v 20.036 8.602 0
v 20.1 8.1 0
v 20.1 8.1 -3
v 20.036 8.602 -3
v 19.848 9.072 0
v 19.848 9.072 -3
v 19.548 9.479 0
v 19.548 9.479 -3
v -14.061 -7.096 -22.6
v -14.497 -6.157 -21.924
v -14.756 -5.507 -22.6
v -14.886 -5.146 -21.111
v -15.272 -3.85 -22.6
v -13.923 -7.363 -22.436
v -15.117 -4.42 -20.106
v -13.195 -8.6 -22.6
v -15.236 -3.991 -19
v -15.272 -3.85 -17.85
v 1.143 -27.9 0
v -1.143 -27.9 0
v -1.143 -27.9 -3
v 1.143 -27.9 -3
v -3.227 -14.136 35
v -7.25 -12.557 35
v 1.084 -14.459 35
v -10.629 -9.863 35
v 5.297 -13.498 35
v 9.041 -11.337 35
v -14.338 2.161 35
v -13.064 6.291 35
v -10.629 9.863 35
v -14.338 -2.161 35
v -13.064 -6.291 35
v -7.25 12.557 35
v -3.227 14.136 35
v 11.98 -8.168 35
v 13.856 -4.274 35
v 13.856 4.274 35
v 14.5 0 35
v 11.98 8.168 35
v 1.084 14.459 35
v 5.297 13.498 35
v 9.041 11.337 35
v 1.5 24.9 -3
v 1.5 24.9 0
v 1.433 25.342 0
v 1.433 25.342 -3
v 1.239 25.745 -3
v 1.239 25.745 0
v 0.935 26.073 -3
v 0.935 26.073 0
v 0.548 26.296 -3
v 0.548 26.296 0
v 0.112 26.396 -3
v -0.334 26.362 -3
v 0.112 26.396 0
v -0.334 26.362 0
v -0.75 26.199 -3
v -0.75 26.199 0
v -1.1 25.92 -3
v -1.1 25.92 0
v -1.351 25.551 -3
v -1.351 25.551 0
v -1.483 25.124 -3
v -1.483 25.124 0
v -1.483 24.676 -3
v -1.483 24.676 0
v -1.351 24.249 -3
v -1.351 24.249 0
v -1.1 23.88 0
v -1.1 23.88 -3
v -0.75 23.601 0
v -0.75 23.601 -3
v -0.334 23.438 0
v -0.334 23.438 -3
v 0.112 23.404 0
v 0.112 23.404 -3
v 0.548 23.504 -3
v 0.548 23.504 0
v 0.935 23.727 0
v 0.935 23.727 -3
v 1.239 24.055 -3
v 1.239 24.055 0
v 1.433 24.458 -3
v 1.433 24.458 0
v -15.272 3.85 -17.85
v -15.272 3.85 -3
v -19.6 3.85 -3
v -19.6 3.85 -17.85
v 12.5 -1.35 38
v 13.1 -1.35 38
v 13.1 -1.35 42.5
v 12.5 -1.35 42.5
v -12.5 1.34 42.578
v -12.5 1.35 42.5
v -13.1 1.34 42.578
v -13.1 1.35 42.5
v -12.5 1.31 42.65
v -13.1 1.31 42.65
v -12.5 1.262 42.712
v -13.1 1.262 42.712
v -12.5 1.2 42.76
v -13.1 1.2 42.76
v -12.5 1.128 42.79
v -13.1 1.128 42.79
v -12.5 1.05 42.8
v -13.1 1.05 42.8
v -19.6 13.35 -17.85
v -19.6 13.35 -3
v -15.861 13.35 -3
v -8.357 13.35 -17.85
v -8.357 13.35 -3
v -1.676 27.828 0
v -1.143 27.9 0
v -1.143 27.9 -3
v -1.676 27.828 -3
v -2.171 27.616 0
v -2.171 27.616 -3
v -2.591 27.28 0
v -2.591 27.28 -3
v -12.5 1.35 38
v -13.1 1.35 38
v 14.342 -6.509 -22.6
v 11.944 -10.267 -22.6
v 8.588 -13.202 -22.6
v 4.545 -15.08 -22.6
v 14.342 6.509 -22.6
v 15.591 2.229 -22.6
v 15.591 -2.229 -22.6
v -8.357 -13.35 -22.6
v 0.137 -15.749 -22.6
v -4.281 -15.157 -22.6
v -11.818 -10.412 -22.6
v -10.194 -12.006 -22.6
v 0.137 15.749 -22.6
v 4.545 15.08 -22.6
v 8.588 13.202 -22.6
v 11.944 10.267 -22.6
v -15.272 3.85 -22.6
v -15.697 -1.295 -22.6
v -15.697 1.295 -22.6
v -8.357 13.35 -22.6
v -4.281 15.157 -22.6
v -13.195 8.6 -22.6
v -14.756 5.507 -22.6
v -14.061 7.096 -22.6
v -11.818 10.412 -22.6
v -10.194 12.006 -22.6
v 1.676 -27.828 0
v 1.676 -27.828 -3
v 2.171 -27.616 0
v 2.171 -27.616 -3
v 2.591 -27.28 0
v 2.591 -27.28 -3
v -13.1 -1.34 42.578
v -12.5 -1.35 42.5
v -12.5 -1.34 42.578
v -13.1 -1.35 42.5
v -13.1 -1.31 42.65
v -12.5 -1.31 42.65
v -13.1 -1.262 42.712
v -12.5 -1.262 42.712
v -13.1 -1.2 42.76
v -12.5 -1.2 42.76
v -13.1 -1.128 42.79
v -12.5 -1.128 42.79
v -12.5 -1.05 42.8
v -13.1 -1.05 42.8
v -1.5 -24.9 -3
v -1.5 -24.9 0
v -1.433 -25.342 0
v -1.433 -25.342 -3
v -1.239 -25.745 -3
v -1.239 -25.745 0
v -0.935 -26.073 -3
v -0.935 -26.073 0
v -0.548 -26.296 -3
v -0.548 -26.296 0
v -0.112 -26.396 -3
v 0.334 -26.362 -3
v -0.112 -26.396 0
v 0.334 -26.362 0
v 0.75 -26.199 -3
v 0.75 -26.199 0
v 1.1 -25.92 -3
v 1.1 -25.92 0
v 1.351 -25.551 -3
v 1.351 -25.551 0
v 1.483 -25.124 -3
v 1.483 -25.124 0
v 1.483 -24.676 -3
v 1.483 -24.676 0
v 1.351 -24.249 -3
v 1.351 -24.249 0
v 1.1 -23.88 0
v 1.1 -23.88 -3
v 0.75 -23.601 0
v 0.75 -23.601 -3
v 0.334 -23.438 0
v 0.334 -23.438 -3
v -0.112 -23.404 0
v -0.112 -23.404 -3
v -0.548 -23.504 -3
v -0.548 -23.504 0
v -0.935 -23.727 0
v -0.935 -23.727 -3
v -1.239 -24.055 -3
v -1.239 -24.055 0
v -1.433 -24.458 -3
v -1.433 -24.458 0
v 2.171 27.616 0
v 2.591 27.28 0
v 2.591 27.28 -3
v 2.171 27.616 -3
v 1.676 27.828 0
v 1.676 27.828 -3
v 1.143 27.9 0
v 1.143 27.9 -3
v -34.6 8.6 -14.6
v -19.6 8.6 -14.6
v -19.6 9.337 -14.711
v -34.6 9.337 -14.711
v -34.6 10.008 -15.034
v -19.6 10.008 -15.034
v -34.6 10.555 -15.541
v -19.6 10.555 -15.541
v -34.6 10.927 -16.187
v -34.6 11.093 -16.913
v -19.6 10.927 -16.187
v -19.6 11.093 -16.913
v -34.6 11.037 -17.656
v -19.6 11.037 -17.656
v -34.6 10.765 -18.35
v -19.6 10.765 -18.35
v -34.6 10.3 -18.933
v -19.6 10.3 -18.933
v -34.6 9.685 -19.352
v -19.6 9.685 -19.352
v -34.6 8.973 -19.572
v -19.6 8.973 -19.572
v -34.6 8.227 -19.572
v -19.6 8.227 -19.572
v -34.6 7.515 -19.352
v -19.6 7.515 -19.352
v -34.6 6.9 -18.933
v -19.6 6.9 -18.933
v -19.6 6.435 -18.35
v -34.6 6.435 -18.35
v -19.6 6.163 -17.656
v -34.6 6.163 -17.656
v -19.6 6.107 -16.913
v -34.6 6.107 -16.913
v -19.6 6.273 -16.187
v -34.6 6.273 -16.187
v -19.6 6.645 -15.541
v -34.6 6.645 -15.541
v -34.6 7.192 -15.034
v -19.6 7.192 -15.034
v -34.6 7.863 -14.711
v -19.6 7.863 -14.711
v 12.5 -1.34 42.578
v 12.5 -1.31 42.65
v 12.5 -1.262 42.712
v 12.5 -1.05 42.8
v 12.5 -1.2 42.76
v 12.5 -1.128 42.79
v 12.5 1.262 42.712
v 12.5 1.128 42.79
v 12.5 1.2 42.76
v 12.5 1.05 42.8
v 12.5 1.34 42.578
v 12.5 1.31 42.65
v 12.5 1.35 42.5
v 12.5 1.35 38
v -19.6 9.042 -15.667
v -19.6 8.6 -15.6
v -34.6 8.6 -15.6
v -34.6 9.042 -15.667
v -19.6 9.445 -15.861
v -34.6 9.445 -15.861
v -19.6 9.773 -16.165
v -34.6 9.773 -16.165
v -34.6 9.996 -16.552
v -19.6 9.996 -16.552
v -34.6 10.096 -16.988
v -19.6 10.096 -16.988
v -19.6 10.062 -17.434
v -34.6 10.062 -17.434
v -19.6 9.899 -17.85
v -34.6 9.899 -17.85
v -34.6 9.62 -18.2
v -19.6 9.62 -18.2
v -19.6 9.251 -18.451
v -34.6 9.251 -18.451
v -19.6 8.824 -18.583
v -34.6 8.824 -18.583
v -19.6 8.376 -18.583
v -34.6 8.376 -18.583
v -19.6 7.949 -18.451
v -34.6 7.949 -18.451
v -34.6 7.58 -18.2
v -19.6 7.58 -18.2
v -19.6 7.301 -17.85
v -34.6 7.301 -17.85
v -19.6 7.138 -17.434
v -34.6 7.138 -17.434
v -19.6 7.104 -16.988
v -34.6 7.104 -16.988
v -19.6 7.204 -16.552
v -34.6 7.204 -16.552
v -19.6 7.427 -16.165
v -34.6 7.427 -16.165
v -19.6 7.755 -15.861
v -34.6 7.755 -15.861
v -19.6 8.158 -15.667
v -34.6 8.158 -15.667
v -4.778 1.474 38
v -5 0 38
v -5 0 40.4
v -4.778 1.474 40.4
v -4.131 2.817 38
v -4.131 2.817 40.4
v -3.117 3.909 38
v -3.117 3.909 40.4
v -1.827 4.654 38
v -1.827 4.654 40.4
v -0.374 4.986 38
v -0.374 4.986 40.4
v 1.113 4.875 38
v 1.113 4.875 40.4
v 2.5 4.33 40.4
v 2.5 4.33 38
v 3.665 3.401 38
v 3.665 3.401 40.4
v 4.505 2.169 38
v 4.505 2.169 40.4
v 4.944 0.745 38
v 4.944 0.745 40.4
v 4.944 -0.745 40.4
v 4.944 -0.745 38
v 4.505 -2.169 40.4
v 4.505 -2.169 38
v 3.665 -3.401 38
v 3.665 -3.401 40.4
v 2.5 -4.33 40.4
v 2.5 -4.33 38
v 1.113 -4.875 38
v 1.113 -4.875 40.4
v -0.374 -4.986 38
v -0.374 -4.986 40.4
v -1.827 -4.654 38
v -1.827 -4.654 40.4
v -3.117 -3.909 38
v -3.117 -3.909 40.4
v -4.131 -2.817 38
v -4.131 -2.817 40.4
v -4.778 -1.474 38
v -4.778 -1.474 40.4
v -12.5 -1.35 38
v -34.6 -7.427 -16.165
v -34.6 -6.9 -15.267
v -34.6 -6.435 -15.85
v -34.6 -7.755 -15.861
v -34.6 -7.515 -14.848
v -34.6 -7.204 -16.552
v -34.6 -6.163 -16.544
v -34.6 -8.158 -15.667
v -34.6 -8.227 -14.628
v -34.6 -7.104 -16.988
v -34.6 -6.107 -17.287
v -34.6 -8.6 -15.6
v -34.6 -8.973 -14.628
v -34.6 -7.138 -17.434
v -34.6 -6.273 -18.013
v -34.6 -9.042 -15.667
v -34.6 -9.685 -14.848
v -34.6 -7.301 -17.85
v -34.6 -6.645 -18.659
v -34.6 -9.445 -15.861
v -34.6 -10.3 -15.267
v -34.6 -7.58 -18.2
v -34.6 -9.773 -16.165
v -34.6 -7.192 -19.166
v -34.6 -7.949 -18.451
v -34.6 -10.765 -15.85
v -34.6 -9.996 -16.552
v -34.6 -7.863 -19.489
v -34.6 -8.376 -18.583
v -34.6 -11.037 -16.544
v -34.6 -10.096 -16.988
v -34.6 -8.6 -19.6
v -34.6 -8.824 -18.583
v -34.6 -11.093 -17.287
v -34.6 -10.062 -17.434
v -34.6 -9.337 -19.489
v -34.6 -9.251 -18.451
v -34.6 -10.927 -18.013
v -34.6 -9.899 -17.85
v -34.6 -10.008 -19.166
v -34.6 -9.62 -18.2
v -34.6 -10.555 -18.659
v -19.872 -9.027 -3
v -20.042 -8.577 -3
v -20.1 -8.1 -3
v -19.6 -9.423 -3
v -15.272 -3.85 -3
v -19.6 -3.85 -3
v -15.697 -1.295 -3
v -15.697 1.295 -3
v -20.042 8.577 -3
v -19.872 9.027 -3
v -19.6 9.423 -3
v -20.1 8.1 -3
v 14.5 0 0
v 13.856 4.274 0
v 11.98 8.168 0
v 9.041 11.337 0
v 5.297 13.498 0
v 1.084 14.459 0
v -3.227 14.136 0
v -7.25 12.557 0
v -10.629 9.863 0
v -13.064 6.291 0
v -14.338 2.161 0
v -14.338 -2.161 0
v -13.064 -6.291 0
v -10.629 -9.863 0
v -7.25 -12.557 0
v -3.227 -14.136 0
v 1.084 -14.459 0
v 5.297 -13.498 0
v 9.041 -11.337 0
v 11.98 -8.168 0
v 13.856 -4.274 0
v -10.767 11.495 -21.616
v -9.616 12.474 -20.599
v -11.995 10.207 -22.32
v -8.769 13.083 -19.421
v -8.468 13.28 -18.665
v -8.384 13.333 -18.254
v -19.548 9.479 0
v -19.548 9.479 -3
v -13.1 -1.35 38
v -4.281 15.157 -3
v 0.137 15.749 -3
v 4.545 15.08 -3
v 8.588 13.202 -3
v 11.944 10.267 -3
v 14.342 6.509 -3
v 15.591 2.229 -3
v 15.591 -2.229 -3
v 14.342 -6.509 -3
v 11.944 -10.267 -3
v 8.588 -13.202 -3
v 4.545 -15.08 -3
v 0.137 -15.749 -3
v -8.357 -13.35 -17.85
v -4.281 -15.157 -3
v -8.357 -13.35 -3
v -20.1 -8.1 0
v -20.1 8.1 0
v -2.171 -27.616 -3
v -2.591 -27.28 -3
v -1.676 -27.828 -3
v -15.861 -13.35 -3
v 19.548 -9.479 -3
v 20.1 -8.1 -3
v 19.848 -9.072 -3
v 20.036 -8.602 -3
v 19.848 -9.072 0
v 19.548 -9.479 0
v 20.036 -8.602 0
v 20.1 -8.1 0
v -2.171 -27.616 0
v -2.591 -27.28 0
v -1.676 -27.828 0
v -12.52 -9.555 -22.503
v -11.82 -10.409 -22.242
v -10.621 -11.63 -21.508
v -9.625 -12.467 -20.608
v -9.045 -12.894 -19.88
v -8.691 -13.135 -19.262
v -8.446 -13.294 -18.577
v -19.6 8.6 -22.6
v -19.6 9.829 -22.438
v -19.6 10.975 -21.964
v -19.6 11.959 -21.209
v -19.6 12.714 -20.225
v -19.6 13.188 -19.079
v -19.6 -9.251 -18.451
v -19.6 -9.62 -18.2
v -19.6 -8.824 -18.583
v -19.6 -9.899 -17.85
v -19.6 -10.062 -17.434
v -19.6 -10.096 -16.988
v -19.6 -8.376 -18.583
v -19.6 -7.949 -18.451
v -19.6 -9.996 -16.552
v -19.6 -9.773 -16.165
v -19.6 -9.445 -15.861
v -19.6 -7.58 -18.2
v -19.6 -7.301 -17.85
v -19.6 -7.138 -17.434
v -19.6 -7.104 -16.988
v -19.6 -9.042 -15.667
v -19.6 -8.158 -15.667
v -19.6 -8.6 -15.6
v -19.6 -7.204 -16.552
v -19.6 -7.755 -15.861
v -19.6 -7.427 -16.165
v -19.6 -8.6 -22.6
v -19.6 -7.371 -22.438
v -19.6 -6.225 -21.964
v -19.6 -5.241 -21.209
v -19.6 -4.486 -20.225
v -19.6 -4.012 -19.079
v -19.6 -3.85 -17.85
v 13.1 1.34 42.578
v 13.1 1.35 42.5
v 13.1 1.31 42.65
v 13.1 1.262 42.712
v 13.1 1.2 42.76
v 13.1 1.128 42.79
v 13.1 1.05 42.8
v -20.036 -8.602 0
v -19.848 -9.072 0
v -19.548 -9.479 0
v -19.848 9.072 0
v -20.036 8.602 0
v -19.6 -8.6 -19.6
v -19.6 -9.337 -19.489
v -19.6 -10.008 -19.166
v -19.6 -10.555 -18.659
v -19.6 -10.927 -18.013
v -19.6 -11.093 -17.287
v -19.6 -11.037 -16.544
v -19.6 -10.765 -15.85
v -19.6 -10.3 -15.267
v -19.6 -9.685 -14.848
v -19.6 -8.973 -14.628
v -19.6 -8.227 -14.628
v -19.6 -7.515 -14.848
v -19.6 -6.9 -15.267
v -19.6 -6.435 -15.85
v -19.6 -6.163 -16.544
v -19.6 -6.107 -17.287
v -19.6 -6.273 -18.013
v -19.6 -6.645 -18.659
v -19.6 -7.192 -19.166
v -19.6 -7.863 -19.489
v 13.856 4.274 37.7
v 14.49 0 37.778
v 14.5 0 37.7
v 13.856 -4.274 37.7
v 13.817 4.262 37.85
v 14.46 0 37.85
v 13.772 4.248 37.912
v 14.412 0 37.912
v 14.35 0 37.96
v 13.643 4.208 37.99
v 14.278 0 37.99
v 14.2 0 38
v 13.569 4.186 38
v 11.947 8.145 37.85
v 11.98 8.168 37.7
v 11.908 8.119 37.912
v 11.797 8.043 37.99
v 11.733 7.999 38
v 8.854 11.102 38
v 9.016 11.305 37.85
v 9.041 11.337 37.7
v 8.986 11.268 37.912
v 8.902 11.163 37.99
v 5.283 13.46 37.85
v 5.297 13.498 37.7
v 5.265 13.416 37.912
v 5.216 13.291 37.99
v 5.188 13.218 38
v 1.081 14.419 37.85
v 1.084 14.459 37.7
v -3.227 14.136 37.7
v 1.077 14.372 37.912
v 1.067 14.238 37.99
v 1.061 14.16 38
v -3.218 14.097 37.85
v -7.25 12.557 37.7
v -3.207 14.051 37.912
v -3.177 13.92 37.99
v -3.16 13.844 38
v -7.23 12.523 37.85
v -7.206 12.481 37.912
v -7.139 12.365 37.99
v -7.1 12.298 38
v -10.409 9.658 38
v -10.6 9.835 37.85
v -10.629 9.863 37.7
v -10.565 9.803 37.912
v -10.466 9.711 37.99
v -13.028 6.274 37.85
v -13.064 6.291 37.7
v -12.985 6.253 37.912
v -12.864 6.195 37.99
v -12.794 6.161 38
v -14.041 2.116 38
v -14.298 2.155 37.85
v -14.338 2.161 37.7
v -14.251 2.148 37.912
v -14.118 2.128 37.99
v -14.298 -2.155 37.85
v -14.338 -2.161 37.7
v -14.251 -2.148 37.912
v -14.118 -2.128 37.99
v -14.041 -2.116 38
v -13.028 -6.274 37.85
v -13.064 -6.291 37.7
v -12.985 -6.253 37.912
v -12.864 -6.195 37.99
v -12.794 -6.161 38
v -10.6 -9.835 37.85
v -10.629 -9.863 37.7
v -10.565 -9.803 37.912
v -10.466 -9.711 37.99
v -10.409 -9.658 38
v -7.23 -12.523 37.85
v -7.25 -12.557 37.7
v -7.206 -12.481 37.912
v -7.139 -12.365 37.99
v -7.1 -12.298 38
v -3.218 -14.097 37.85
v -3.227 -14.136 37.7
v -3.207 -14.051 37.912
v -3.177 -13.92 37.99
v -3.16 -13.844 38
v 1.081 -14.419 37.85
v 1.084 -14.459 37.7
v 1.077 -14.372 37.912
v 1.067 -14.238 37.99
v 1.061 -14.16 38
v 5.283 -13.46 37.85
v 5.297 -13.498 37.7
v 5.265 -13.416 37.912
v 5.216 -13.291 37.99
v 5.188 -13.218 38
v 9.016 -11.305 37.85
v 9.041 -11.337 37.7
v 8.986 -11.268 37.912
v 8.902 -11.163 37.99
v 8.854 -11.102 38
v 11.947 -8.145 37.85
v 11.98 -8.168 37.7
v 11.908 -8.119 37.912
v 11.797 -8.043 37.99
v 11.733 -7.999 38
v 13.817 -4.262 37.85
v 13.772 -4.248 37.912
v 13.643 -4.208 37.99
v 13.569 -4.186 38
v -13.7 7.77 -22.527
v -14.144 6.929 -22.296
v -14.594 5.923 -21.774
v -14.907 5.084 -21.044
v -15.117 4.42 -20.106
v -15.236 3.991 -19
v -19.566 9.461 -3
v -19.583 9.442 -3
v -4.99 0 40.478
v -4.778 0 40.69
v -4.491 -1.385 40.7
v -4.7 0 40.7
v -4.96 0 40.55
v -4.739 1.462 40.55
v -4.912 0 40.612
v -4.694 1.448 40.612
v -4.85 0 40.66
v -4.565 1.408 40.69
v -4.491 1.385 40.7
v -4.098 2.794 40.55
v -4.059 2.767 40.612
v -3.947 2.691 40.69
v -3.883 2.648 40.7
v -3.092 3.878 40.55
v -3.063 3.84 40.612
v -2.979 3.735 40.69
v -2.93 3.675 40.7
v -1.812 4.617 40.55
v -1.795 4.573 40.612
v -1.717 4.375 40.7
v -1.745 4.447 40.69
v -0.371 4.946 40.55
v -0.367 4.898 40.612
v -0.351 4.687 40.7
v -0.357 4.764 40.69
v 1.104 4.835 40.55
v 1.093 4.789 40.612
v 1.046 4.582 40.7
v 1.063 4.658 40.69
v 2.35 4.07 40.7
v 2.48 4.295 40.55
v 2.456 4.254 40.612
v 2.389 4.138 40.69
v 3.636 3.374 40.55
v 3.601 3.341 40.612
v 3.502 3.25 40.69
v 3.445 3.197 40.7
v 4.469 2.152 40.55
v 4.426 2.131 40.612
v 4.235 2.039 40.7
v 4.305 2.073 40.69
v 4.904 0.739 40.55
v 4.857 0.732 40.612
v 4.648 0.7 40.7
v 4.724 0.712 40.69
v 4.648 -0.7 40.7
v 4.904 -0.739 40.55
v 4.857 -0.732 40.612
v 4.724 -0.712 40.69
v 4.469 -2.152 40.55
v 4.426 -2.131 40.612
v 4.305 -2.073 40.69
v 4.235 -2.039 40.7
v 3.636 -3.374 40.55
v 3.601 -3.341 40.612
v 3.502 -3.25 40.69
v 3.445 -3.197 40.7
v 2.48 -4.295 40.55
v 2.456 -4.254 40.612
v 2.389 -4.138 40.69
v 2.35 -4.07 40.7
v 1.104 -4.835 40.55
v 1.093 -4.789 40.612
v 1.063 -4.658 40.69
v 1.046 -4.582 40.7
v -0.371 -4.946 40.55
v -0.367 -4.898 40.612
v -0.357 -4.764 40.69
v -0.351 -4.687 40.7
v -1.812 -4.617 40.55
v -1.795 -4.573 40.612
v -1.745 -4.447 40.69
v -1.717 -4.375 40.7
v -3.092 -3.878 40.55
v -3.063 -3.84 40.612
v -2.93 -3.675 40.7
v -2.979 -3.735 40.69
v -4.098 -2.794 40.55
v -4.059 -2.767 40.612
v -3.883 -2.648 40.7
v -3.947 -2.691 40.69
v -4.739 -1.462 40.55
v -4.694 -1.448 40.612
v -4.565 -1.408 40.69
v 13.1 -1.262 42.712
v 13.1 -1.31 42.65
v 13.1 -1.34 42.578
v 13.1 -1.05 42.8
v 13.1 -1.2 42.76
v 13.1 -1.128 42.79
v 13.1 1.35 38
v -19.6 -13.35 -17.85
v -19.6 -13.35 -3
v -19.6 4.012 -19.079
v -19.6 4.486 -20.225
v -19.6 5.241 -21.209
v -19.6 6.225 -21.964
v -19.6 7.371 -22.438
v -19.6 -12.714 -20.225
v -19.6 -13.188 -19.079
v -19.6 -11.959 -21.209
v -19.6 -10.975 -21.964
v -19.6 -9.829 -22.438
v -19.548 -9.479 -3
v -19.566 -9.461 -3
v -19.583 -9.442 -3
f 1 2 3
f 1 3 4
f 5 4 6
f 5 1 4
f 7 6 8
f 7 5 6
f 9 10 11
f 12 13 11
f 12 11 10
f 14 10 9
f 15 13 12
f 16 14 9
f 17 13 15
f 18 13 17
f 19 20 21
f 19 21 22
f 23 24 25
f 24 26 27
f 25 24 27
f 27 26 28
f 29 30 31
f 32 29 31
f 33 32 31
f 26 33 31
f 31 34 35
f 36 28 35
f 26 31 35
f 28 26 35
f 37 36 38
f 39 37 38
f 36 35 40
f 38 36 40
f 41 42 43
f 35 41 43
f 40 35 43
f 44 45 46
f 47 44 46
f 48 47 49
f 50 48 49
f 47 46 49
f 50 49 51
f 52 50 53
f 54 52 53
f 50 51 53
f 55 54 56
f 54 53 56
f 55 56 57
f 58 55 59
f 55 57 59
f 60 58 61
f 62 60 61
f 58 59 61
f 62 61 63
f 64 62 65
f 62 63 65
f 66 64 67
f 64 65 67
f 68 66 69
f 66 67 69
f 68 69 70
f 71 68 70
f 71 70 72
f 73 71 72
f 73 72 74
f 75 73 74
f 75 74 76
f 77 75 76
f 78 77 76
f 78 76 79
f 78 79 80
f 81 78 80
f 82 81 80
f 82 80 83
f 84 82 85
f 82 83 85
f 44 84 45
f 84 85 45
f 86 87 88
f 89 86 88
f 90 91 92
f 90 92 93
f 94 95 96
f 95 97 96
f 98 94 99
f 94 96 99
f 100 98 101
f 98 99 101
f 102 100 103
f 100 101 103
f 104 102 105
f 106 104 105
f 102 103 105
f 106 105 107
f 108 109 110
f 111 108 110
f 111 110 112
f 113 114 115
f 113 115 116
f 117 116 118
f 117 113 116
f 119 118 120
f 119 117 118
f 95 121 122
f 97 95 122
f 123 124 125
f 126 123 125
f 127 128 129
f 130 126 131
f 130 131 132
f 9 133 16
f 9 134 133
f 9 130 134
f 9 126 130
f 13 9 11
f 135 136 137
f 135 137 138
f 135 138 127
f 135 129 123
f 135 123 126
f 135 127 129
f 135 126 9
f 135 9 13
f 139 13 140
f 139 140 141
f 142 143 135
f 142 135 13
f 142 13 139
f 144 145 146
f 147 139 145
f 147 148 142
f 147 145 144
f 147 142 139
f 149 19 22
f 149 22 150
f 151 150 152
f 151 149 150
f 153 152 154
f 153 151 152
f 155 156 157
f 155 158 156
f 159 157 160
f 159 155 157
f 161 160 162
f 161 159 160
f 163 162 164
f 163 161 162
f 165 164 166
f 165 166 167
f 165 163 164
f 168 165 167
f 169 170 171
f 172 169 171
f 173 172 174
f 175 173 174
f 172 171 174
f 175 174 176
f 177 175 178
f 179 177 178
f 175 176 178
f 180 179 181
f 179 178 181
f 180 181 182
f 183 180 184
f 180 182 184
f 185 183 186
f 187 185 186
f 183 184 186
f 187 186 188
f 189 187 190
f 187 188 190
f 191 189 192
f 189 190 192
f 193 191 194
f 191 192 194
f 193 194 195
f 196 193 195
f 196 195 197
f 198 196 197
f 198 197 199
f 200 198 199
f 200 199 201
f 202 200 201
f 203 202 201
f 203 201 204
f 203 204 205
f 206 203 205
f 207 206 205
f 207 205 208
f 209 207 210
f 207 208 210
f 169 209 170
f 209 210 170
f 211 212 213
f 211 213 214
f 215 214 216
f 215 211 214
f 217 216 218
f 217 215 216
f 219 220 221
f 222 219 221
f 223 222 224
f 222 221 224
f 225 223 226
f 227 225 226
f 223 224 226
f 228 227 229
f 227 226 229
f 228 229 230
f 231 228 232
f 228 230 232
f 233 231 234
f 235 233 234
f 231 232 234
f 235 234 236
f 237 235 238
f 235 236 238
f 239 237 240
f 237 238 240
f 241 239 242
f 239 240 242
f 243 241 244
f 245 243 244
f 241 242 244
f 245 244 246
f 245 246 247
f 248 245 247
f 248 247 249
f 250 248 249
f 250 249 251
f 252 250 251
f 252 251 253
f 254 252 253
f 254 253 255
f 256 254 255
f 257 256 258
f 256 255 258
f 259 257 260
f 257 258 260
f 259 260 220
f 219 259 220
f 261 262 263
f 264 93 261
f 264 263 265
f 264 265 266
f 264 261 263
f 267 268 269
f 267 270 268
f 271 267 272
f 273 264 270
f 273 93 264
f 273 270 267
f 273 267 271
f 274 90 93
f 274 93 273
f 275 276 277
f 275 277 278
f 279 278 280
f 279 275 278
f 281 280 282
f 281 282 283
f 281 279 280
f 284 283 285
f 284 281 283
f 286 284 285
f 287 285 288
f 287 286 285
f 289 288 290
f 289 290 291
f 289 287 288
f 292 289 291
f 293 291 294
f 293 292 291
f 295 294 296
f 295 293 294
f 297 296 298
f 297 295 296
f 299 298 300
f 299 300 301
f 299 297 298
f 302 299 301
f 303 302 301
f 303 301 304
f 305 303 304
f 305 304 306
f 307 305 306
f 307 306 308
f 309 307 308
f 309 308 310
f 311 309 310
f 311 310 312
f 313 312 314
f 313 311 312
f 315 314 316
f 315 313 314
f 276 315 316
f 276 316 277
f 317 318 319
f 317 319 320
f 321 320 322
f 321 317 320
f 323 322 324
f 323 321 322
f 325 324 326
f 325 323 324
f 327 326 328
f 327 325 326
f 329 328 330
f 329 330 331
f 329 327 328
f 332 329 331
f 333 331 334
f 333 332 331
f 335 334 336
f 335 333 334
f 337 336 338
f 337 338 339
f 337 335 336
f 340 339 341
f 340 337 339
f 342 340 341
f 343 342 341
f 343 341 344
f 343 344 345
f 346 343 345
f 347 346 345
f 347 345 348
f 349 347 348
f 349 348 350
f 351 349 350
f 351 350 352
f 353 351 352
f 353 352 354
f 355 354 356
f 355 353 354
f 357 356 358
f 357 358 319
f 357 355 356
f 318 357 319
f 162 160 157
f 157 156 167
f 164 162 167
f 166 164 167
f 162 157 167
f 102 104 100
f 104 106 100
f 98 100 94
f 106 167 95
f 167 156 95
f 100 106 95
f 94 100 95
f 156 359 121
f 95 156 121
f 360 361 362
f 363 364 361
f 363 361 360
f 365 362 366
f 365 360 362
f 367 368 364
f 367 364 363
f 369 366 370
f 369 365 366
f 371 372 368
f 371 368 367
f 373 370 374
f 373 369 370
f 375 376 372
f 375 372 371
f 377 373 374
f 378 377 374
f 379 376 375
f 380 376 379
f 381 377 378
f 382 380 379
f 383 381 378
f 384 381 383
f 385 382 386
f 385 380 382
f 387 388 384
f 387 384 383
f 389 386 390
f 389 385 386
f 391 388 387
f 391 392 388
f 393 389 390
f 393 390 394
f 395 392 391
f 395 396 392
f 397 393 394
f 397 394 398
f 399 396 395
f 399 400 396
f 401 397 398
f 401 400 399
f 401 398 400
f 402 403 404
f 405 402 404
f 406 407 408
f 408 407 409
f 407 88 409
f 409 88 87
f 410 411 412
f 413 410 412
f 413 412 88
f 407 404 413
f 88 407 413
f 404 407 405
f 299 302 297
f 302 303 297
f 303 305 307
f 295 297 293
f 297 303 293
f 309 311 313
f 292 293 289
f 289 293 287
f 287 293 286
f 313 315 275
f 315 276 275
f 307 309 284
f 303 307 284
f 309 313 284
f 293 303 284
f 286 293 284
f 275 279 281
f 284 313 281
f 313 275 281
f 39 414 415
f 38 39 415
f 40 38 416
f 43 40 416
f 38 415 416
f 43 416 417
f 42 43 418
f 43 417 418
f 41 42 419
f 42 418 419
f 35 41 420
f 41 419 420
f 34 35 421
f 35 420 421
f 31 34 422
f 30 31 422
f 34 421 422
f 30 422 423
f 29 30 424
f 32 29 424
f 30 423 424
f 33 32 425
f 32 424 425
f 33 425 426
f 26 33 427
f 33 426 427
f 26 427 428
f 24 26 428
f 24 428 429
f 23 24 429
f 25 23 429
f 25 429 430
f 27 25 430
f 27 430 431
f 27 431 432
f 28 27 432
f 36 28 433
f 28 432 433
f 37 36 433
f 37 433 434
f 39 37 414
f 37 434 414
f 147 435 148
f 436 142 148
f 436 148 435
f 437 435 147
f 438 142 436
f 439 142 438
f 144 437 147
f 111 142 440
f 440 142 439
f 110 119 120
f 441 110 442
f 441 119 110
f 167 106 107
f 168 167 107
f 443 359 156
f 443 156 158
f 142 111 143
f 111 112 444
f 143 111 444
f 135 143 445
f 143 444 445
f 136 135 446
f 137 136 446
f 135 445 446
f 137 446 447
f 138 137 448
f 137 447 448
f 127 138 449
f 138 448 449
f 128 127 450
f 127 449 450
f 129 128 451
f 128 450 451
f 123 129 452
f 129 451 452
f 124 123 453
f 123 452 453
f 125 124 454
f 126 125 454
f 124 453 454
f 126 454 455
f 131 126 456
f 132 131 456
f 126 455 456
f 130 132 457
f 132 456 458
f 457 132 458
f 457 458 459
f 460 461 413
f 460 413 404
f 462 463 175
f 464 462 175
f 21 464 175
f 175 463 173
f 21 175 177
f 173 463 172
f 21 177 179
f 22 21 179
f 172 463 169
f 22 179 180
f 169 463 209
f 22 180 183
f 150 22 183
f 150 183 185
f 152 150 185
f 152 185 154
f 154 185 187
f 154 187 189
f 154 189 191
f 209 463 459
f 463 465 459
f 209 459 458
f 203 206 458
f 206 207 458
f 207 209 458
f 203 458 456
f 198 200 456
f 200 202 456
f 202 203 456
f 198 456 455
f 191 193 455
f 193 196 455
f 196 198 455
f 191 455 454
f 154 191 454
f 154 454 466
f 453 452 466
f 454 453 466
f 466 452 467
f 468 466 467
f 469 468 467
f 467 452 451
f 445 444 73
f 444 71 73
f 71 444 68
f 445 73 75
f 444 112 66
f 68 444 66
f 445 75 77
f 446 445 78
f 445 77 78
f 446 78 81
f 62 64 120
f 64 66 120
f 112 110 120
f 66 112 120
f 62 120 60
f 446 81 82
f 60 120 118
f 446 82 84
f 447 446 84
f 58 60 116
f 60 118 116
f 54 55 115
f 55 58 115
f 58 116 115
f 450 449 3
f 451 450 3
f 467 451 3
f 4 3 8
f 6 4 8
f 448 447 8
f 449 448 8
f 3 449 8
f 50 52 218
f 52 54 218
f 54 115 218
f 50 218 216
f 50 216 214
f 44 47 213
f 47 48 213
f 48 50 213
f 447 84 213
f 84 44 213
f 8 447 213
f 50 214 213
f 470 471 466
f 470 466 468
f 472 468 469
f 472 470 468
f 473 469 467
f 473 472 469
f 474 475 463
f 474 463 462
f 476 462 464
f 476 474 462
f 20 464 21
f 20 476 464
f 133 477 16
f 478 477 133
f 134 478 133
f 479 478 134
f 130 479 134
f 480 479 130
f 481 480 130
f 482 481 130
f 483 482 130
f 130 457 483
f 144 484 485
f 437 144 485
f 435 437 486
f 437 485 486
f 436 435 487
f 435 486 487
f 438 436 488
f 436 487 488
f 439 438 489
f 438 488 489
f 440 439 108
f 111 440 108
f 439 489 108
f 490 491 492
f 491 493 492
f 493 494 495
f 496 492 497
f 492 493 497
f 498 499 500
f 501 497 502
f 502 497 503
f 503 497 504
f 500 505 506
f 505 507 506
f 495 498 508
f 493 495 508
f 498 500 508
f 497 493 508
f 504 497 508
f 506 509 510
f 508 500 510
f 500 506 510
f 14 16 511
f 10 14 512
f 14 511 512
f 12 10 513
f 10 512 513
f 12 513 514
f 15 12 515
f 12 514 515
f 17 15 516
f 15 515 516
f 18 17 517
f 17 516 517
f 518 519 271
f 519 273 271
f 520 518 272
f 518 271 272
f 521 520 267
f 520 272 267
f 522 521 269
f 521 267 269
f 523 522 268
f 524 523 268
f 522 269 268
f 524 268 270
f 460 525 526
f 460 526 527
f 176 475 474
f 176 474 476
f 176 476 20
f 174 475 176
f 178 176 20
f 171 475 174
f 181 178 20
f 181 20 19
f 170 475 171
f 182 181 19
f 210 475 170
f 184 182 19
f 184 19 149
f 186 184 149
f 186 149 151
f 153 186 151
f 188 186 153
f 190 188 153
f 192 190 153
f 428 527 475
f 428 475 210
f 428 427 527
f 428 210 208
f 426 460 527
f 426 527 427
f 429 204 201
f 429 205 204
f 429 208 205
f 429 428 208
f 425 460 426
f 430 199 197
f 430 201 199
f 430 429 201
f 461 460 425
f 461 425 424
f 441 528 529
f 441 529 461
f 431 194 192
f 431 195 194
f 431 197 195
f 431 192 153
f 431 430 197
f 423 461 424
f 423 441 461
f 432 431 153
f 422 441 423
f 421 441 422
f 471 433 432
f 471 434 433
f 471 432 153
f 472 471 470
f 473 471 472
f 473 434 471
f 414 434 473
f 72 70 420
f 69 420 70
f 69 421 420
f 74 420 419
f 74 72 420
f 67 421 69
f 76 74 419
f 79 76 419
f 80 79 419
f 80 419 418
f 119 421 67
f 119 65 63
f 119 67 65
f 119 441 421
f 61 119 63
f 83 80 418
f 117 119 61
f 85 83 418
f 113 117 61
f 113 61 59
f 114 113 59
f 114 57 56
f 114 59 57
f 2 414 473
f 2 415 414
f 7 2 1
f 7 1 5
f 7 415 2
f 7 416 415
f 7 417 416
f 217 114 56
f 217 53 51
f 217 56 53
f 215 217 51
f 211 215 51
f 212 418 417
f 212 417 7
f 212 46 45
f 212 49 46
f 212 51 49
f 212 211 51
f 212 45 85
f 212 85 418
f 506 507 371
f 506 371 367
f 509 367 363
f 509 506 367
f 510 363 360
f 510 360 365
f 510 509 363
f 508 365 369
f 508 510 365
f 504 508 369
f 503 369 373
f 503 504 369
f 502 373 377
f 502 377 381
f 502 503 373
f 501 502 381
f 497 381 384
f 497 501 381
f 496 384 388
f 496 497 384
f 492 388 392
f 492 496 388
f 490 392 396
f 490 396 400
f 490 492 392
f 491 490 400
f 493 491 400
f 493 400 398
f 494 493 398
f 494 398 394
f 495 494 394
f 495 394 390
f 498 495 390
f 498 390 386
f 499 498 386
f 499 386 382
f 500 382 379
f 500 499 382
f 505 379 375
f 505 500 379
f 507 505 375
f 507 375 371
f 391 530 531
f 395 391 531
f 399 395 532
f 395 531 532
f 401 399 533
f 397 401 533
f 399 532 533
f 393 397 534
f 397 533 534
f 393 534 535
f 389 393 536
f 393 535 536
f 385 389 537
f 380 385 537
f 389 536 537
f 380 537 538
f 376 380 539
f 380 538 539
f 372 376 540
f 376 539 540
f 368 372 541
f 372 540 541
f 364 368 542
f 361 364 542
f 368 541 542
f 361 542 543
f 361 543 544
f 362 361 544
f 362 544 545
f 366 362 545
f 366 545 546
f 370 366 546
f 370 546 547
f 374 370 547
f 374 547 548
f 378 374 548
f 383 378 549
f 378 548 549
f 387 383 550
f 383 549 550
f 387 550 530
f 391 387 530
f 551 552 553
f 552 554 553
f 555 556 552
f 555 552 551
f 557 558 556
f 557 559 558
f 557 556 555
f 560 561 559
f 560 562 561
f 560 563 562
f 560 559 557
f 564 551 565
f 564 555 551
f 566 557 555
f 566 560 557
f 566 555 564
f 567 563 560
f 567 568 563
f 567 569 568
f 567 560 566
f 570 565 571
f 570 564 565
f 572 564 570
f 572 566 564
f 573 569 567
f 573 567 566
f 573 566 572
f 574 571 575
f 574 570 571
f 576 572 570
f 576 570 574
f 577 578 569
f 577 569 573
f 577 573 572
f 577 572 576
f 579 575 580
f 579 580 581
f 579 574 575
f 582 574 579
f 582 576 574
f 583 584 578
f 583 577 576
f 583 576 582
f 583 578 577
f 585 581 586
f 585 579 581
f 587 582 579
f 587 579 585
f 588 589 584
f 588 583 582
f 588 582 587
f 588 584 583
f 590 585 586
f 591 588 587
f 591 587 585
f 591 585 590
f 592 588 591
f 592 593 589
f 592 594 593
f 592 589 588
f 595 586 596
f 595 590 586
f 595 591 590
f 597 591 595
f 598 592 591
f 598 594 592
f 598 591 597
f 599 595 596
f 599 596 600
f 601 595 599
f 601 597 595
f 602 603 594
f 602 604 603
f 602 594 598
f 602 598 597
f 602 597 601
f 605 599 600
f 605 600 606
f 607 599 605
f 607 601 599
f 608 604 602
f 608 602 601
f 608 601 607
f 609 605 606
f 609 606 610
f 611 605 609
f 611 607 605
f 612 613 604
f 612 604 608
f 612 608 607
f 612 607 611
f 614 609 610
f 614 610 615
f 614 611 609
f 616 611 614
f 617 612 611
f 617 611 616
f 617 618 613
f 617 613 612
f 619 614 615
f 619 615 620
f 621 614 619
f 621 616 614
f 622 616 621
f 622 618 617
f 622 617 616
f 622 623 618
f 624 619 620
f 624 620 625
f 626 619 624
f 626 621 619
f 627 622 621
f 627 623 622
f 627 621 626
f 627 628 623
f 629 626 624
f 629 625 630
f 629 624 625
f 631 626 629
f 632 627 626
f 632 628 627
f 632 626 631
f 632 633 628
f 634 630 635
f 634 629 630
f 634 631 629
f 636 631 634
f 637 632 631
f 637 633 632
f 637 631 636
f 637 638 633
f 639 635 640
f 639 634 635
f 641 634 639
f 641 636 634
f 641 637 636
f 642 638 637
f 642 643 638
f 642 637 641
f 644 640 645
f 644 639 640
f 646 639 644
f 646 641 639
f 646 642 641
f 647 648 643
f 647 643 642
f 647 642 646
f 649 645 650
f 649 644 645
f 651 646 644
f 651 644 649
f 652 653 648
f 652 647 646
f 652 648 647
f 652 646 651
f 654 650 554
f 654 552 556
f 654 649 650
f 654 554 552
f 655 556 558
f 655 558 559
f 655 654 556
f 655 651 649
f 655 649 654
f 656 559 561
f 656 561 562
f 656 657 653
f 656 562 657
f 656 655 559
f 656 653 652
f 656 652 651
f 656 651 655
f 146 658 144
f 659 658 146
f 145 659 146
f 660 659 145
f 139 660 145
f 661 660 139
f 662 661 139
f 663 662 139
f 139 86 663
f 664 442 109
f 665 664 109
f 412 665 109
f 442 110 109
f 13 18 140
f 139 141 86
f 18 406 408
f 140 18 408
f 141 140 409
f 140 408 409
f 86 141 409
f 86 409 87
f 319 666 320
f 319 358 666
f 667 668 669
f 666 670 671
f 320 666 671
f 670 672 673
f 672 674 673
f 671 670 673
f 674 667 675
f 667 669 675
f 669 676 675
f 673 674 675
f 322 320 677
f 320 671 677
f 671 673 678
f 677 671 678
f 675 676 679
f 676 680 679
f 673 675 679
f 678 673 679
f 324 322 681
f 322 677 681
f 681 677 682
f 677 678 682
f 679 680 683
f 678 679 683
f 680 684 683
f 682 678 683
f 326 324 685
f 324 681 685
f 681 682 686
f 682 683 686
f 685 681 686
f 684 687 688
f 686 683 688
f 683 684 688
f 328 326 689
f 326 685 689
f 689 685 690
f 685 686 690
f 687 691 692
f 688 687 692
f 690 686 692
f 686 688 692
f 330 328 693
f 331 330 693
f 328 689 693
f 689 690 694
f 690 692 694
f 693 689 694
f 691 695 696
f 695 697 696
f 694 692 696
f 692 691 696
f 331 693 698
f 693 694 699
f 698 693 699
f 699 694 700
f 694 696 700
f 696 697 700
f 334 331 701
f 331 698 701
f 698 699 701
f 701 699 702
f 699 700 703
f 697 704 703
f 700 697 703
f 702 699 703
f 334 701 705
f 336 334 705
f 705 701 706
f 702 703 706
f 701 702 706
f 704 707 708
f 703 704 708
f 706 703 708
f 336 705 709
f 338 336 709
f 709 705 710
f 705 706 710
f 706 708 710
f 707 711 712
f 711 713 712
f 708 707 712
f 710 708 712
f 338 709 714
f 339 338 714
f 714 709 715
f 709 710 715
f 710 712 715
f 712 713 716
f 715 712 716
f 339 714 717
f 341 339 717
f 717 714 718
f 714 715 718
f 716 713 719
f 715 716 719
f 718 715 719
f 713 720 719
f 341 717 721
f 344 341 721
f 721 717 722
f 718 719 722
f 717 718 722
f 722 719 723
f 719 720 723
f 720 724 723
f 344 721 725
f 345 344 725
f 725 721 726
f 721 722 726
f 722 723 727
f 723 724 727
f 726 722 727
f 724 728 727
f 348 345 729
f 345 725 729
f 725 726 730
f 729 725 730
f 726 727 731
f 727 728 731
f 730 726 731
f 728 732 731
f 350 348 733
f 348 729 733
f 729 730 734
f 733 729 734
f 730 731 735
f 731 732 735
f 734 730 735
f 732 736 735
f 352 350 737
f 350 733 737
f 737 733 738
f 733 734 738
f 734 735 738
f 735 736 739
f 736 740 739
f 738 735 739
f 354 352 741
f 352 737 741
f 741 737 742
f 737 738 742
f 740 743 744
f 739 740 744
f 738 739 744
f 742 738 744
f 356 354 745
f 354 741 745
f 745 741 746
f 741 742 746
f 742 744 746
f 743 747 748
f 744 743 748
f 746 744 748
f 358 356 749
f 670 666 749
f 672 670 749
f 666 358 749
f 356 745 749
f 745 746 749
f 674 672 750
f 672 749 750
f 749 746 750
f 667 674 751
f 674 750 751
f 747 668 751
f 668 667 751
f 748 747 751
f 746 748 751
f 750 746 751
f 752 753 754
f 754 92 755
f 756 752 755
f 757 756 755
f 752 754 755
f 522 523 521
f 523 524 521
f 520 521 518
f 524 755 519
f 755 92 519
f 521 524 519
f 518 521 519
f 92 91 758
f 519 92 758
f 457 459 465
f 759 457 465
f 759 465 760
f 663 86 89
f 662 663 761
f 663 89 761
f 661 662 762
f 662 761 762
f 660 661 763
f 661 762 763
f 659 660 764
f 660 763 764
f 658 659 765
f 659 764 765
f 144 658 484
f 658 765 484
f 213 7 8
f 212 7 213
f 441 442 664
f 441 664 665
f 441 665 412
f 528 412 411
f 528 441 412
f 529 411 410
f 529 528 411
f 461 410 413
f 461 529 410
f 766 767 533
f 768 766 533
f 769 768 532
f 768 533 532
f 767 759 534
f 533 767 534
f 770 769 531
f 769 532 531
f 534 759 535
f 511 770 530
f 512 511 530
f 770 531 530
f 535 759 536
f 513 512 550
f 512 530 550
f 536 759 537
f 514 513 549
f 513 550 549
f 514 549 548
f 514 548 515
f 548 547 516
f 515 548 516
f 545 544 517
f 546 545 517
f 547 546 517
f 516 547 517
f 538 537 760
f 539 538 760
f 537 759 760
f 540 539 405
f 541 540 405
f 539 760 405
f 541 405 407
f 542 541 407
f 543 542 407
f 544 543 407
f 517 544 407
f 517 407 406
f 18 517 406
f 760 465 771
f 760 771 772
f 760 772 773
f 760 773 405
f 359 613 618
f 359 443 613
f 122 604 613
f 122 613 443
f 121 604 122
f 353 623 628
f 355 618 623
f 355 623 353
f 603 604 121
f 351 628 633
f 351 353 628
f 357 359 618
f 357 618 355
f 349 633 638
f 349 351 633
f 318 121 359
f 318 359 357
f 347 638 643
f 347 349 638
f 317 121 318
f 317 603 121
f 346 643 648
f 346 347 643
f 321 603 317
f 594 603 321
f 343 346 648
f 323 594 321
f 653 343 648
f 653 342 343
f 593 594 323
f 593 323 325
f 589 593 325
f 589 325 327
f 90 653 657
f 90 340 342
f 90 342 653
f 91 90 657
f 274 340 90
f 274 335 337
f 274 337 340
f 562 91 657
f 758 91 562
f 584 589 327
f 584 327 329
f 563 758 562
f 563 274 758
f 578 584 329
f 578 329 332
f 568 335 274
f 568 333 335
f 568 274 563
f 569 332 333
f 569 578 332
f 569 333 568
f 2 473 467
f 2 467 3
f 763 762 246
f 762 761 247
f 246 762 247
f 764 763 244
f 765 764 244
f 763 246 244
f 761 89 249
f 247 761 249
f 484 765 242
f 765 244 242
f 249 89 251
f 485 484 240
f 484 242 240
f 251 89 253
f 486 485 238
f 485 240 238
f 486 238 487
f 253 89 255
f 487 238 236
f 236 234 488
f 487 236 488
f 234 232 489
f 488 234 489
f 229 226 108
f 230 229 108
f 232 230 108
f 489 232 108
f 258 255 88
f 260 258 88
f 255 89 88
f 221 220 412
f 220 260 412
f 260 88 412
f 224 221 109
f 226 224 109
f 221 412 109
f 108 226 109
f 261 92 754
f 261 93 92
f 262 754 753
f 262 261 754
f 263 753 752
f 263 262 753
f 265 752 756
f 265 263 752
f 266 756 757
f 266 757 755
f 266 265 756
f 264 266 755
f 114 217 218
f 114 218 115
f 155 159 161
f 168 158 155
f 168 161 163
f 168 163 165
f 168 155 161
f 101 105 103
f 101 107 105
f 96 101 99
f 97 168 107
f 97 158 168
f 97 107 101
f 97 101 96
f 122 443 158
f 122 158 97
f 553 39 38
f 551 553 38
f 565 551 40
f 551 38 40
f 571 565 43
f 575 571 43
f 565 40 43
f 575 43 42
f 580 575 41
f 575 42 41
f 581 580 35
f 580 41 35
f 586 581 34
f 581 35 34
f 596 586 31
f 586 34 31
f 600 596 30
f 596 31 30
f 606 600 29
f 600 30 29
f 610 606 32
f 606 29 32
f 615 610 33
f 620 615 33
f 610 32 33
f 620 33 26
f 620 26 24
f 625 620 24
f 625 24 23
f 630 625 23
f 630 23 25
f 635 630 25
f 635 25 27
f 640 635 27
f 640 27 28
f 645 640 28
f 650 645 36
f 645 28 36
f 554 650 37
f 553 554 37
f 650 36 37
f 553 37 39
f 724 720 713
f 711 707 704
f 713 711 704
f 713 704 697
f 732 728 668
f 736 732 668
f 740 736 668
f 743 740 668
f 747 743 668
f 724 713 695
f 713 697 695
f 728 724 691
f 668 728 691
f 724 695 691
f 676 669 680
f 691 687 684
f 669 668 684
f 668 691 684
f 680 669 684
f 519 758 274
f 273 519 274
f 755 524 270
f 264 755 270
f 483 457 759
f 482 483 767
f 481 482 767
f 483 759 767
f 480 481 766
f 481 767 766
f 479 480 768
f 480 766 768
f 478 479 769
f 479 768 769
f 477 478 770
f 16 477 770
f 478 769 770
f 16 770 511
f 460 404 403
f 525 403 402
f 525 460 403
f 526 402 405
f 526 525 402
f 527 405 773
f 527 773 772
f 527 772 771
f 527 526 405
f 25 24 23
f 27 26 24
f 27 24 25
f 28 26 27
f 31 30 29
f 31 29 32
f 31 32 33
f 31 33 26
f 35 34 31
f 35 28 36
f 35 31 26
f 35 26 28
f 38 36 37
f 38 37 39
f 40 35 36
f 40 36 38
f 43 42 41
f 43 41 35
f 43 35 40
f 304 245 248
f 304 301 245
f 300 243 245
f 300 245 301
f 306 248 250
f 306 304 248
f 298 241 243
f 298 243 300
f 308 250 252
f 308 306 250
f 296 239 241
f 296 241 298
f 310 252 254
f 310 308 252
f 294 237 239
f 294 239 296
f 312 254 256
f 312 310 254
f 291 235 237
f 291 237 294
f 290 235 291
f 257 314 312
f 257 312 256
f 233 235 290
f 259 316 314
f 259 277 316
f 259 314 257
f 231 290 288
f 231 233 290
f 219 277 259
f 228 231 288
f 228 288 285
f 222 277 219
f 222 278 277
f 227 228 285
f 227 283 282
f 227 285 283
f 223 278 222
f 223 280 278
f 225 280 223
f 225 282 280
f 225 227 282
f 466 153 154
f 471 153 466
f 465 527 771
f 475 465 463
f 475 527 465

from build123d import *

# Parameters (mm, degrees)
SKETCH1_R               = 14.5
BOSS_EXTRUDE1_DEPTH     = 35
SKETCH3_R               = 14.5
BOSS_EXTRUDE2_DEPTH     = 3
SKETCH5_R               = 5
BOSS_EXTRUDE3_DEPTH     = 2.7
SKETCH6_W               = 0.6
SKETCH6_H               = 2.7
BOSS_EXTRUDE4_DEPTH     = 4.8
FILLET1_R               = 0.3
SKETCH7_R               = 1.5
BOSS_EXTRUDE5_DEPTH     = 3
SKETCH8_R               = 15.75
BOSS_EXTRUDE6_DEPTH     = 19.6
CUT_EXTRUDE1_REACH      = 66.702
CUT_EXTRUDE1_END_RADIUS = 15.75
SKETCH10_R              = 2.5
SKETCH10_R_2            = 1.5
BOSS_EXTRUDE7_DEPTH     = 15


with BuildPart() as part:
    # Sketch1 → Boss-Extrude1 (new body)
    with BuildSketch(Plane.XY):
        Circle(SKETCH1_R)
    extrude(amount=BOSS_EXTRUDE1_DEPTH)

    # Sketch7 → Boss-Extrude5 (add)
    with BuildSketch(Plane.XY):
        with BuildLine():
            Line((19.5480946, 9.47934821), (2.59110728, 27.279500645))
            ThreePointArc((2.59110728, 27.279500645), (1.930730495, 27.738341819), (1.14301268, 27.9))
            Line((1.14301268, 27.9), (-1.14301268, 27.9))
            ThreePointArc((-1.14301268, 27.9), (-1.930730495, 27.738341819), (-2.59110728, 27.279500645))
            Line((-2.59110728, 27.279500645), (-19.5480946, 9.47934821))
            ThreePointArc((-19.5480946, 9.47934821), (-19.956904575, 8.842750924), (-20.1, 8.099847565))
            Line((-20.1, 8.099847565), (-20.1, -8.099847565))
            ThreePointArc((-20.1, -8.099847565), (-19.956904575, -8.842750924), (-19.5480946, -9.47934821))
            Line((-19.5480946, -9.47934821), (-2.59110728, -27.279500645))
            ThreePointArc((-2.59110728, -27.279500645), (-1.930730495, -27.738341819), (-1.14301268, -27.9))
            Line((-1.14301268, -27.9), (1.14301268, -27.9))
            ThreePointArc((1.14301268, -27.9), (1.930730495, -27.738341819), (2.59110728, -27.279500645))
            Line((2.59110728, -27.279500645), (19.5480946, -9.47934821))
            ThreePointArc((19.5480946, -9.47934821), (19.956904575, -8.842750924), (20.1, -8.099847565))
            Line((20.1, -8.099847565), (20.1, 8.099847565))
            ThreePointArc((20.1, 8.099847565), (19.956904575, 8.842750924), (19.5480946, 9.47934821))
        make_face()
        with Locations((0, 24.9)):
            Circle(SKETCH7_R, mode=Mode.SUBTRACT)
        with Locations(Location((0, -24.9, 0), (0, 0, 180))):
            Circle(SKETCH7_R, mode=Mode.SUBTRACT)
    extrude(amount=-BOSS_EXTRUDE5_DEPTH)

    # Sketch8 → Boss-Extrude6 (add)
    with BuildSketch(Plane(origin=(0, 0, -3), x_dir=(-1, 0, 0), z_dir=(0, 0, -1))):
        Circle(SKETCH8_R)
        with BuildLine():
            Line((15.27219696, 3.85), (19.6, 3.85))
            Line((19.6, 3.85), (19.6, 13.35))
            Line((19.6, 13.35), (8.357032966, 13.35))
            ThreePointArc((8.357032966, 13.35), (12.733720067, 9.269027633), (15.27219696, 3.85))
        make_face()
        with BuildLine():
            Line((19.6, -3.85), (15.27219696, -3.85))
            ThreePointArc((15.27219696, -3.85), (12.733720067, -9.269027633), (8.357032966, -13.35))
            Line((8.357032966, -13.35), (19.6, -13.35))
            Line((19.6, -13.35), (19.6, -3.85))
        make_face()
    extrude(amount=BOSS_EXTRUDE6_DEPTH)

    # Cut-Extrude1: up to this cylinder (the profile starts outside it)
    cut_extrude1_end = Plane(origin=(0, 0, -21.539002), z_dir=(0, 0, 1)) * Cylinder(CUT_EXTRUDE1_END_RADIUS, 165.904, mode=Mode.PRIVATE)
    # Sketch9 → Cut-Extrude1 (cut, up to the surface)
    with BuildSketch(Plane.ZY.offset(19.6), mode=Mode.PRIVATE) as cut_extrude1_sk1:
        with BuildLine():
            Line((-17.85, 13.35), (-22.6, 13.35))
            Line((-22.6, 13.35), (-22.6, 8.6))
            ThreePointArc((-22.6, 8.6), (-21.208757211, 11.958757211), (-17.85, 13.35))
        make_face()
    cut_extrude1_tool1 = extrude(cut_extrude1_sk1.sketch, amount=-CUT_EXTRUDE1_REACH, mode=Mode.PRIVATE) - cut_extrude1_end
    add(cut_extrude1_tool1.solids().sort_by_distance((-19.6, 12.289002, -21.539002))[0], mode=Mode.SUBTRACT)
    # Sketch9 → Cut-Extrude1 (cut, up to the surface)
    with BuildSketch(Plane.ZY.offset(19.6), mode=Mode.PRIVATE) as cut_extrude1_sk2:
        with BuildLine():
            ThreePointArc((-17.85, 3.85), (-21.208757211, 5.241242789), (-22.6, 8.6))
            Line((-22.6, 8.6), (-22.6, 3.85))
            Line((-22.6, 3.85), (-17.85, 3.85))
        make_face()
    cut_extrude1_tool2 = extrude(cut_extrude1_sk2.sketch, amount=-CUT_EXTRUDE1_REACH, mode=Mode.PRIVATE) - cut_extrude1_end
    add(cut_extrude1_tool2.solids().sort_by_distance((-19.6, 4.910998, -21.539002))[0], mode=Mode.SUBTRACT)
    # Sketch9 → Cut-Extrude1 (cut, up to the surface)
    with BuildSketch(Plane.ZY.offset(19.6), mode=Mode.PRIVATE) as cut_extrude1_sk3:
        with BuildLine():
            ThreePointArc((-22.6, -8.6), (-21.208757211, -5.241242789), (-17.85, -3.85))
            Line((-17.85, -3.85), (-22.6, -3.85))
            Line((-22.6, -3.85), (-22.6, -8.6))
        make_face()
    cut_extrude1_tool3 = extrude(cut_extrude1_sk3.sketch, amount=-CUT_EXTRUDE1_REACH, mode=Mode.PRIVATE) - cut_extrude1_end
    add(cut_extrude1_tool3.solids().sort_by_distance((-19.6, -4.910998, -21.539002))[0], mode=Mode.SUBTRACT)
    # Sketch9 → Cut-Extrude1 (cut, up to the surface)
    with BuildSketch(Plane.ZY.offset(19.6), mode=Mode.PRIVATE) as cut_extrude1_sk4:
        with BuildLine():
            ThreePointArc((-17.85, -13.35), (-21.208757211, -11.958757211), (-22.6, -8.6))
            Line((-22.6, -8.6), (-22.6, -13.35))
            Line((-22.6, -13.35), (-17.85, -13.35))
        make_face()
    cut_extrude1_tool4 = extrude(cut_extrude1_sk4.sketch, amount=-CUT_EXTRUDE1_REACH, mode=Mode.PRIVATE) - cut_extrude1_end
    add(cut_extrude1_tool4.solids().sort_by_distance((-19.6, -12.289002, -21.539002))[0], mode=Mode.SUBTRACT)

    # Sketch10 → Boss-Extrude7 (add)
    with BuildSketch(Plane.ZY.offset(19.6)):
        with Locations((-17.1, 8.6)):
            Circle(SKETCH10_R)
        with Locations((-17.1, 8.6)):
            Circle(SKETCH10_R_2, mode=Mode.SUBTRACT)
        with Locations(Location((-17.1, -8.6, 0), (0, 0, 180))):
            Circle(SKETCH10_R)
        with Locations((-17.1, -8.6)):
            Circle(SKETCH10_R_2, mode=Mode.SUBTRACT)
    extrude(amount=BOSS_EXTRUDE7_DEPTH)


with BuildPart() as body_2:
    # Sketch3 → Boss-Extrude2 (new body)
    with BuildSketch(Plane.XY.offset(35)):
        Circle(SKETCH3_R)
    extrude(amount=BOSS_EXTRUDE2_DEPTH)

    # Sketch5 → Boss-Extrude3 (add)
    with BuildSketch(Plane(origin=(0, 0, 38), x_dir=(-1, 0, 0), z_dir=(0, 0, -1))):
        Circle(SKETCH5_R)
    extrude(amount=-BOSS_EXTRUDE3_DEPTH)

    # Sketch6 → Boss-Extrude4 (add)
    with BuildSketch(Plane(origin=(0, 0, 38), x_dir=(-1, 0, 0), z_dir=(0, 0, -1))):
        with Locations((-12.8, 0)):
            Rectangle(SKETCH6_W, SKETCH6_H)
        with Locations((12.8, 0)):
            Rectangle(SKETCH6_W, SKETCH6_H)
    extrude(amount=-BOSS_EXTRUDE4_DEPTH)

    # Fillet1
    fillet1_edges = [body_2.edges().sort_by_distance(p)[0] for p in [
        (12.8, 1.35, 42.8),
        (12.8, -1.35, 42.8),
        (-12.8, -1.35, 42.8),
        (-12.8, 1.35, 42.8),
        (-14.5, 0, 38),
        (5, 0, 40.7),
    ]]
    fillet(fillet1_edges, radius=FILLET1_R)


solid = Compound([part.part, body_2.part])
